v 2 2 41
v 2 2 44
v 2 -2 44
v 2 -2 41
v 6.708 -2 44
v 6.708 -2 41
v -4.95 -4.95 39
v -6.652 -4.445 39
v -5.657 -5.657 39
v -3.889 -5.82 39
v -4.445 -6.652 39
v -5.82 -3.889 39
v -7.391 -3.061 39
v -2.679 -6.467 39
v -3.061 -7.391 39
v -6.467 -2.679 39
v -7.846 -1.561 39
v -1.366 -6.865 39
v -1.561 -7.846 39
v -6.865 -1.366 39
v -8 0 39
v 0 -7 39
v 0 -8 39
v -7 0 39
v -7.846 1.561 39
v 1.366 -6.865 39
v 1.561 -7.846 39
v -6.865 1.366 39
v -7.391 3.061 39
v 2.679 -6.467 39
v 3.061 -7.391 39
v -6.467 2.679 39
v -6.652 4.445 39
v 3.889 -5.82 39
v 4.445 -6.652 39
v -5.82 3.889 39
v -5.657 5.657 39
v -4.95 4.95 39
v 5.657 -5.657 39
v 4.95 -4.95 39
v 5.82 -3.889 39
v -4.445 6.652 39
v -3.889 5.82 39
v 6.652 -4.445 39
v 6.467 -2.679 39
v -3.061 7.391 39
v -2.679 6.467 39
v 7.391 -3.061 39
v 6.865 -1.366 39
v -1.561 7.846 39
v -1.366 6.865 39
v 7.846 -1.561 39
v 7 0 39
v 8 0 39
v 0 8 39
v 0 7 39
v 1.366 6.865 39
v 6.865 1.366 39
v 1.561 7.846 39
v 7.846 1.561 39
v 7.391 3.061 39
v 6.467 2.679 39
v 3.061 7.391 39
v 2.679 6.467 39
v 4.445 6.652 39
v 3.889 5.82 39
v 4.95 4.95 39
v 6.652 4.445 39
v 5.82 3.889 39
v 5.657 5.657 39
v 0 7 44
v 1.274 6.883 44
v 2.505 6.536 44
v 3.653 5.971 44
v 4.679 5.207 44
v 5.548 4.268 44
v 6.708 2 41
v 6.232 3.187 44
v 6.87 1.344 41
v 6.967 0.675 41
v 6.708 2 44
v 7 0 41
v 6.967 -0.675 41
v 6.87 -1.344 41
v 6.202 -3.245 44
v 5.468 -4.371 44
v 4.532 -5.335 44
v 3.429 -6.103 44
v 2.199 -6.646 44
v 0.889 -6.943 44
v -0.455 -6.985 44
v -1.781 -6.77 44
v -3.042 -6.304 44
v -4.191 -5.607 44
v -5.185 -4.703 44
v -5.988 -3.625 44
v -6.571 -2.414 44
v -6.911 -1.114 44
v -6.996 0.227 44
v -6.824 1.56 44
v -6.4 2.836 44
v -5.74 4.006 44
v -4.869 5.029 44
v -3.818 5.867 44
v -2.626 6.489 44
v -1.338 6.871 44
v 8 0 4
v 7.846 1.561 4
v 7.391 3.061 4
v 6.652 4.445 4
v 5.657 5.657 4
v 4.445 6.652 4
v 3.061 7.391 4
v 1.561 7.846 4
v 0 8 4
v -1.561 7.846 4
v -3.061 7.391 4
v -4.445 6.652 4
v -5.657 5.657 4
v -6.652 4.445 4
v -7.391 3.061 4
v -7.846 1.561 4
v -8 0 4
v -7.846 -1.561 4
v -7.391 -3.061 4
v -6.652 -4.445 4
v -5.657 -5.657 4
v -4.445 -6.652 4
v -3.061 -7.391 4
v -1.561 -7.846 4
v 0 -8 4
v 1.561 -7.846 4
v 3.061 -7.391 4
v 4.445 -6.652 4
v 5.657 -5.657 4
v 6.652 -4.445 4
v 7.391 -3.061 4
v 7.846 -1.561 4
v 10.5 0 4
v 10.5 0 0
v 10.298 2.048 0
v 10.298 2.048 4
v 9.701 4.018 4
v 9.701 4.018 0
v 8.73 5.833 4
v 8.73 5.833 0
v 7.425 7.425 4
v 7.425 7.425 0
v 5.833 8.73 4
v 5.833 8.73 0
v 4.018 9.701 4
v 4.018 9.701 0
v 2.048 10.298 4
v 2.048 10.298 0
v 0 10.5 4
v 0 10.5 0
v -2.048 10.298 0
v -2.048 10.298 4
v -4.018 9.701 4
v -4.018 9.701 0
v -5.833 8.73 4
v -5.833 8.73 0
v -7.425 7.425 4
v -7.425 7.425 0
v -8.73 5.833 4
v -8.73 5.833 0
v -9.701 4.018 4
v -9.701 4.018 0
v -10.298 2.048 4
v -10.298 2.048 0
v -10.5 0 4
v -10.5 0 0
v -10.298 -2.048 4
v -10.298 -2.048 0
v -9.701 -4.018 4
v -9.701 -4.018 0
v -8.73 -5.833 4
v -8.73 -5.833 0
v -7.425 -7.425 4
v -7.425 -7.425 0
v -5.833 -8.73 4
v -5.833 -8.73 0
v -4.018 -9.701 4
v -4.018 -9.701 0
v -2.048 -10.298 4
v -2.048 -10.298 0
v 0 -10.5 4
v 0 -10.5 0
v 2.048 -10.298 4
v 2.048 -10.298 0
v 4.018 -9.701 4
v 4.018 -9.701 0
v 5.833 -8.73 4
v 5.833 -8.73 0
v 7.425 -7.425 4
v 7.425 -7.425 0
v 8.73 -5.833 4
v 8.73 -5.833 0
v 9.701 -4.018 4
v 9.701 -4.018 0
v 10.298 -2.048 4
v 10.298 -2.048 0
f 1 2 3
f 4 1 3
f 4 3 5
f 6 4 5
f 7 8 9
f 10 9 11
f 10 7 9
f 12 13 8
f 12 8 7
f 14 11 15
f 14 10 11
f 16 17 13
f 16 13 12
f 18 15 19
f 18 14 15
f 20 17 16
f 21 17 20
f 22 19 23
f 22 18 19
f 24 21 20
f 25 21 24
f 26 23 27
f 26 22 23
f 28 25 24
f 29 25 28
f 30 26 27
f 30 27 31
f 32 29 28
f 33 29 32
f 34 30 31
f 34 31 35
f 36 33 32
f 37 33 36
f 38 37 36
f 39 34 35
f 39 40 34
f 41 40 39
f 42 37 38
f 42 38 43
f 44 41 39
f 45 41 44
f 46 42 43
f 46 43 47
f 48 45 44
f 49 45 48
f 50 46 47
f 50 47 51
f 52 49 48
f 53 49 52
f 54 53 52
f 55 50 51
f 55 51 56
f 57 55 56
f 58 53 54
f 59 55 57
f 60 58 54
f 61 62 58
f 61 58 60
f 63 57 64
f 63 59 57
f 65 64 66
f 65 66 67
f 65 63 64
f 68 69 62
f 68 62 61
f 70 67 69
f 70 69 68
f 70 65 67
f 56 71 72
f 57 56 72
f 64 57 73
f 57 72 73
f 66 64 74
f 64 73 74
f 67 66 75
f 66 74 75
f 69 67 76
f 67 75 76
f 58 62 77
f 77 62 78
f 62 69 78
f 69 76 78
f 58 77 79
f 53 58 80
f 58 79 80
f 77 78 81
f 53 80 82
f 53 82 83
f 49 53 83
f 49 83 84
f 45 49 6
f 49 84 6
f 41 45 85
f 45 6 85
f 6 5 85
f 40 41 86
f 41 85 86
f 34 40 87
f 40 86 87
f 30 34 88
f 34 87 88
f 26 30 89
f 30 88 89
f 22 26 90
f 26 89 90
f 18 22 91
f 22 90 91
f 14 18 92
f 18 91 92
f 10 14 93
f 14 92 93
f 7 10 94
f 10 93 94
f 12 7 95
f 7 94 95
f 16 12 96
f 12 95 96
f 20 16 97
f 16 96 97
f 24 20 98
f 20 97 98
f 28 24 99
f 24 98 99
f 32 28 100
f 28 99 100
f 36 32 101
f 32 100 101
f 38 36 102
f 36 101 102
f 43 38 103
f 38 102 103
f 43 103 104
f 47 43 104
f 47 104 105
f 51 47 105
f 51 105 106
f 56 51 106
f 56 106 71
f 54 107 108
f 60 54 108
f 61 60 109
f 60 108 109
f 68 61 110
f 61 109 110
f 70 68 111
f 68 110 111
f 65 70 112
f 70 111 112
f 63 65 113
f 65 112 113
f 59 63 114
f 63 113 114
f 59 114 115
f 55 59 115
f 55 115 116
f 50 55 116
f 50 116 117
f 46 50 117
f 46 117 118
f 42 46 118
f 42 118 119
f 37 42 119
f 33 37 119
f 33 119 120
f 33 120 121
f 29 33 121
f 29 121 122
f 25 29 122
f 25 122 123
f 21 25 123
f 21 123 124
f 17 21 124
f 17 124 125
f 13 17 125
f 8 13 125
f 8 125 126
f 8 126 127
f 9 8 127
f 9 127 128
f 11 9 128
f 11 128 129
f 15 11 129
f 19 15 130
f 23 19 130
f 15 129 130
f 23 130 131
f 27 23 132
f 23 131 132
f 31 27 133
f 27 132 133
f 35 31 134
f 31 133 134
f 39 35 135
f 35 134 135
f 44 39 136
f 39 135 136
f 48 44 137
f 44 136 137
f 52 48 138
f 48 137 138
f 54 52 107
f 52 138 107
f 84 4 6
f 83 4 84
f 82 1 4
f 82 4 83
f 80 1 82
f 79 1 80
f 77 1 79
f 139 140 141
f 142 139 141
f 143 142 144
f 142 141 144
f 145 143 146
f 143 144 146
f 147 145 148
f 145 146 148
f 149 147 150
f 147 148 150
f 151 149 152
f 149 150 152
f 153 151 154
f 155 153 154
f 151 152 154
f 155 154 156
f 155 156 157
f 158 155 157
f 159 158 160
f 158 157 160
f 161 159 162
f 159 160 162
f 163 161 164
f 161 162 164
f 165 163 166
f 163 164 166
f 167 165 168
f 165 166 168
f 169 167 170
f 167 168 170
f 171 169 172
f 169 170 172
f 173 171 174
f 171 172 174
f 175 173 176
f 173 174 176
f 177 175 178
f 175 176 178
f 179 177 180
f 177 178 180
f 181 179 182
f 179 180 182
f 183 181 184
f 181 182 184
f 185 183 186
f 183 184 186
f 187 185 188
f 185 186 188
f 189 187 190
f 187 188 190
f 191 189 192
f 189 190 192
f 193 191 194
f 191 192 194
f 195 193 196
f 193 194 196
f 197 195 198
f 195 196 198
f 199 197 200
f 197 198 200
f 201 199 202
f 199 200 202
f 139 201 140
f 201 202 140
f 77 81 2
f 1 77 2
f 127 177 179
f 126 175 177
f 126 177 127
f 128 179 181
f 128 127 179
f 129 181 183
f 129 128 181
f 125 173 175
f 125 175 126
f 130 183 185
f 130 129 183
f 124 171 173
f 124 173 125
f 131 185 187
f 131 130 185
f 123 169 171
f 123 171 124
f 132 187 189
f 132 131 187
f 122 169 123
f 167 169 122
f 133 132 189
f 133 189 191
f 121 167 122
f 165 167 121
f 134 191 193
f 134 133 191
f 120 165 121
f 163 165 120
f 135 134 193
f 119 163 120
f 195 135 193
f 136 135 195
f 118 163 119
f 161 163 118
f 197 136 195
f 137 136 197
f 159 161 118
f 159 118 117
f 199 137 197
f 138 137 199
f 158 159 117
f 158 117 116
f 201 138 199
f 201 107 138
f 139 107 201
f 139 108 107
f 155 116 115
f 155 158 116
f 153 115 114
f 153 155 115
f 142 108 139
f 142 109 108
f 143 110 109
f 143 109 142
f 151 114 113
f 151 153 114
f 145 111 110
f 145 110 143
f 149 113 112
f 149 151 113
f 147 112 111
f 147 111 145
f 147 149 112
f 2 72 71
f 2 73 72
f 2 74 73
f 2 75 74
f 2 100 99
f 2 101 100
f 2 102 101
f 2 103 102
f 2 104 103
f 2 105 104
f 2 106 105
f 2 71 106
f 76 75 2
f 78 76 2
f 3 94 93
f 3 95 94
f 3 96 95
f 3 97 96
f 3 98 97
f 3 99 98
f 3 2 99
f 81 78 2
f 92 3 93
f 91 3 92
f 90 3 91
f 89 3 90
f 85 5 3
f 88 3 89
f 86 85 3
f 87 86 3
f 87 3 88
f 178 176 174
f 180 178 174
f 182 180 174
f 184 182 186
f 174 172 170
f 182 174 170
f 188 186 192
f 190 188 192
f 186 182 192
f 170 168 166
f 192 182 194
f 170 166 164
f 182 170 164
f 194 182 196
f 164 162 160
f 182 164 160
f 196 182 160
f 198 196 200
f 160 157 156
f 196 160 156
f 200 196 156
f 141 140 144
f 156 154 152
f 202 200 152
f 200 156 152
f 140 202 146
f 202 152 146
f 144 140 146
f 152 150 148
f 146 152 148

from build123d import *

# Parameters (mm, degrees)
F0_R     = 10.5
F1_DEPTH = 4
F2_R     = 8
F3_DEPTH = 39
F4_W     = 7
F4_H     = 5
F7_DEPTH = 3


with BuildPart() as f1:
    # F0 (on Top) → F1 (new body)
    with BuildSketch(Plane.XY):
        Circle(F0_R)
    extrude(amount=F1_DEPTH)

    # F2 (on Top) → F3 (join)
    with BuildSketch(Plane.XY):
        Circle(F2_R)
    extrude(amount=F3_DEPTH)

    # F4 (on Right) → F5 (revolve)
    with BuildSketch(Plane.YZ):
        with Locations((3.5, 41.5)):
            Rectangle(F4_W, F4_H)
    revolve(axis=Axis((0, 0, 41.5), (0, 0, -1)))

    # F6 (on face) → F7 (cut)
    with BuildSketch(Plane.XY.offset(44)):
        with BuildLine():
            Line((6.7082039325, 2), (2, 2))
            Line((2, 2), (2, -2.0000025367))
            Line((2, -2.0000025367), (6.7082031762, -2.0000025367))
            ThreePointArc((6.7082031762, -2.0000025367), (6.9266666671, -1.0105883847), (7, 0))
            ThreePointArc((7, 0), (6.9266668581, 1.010587075), (6.7082039325, 2))
        make_face()
    extrude(amount=-F7_DEPTH, mode=Mode.SUBTRACT)


solid = f1.part
